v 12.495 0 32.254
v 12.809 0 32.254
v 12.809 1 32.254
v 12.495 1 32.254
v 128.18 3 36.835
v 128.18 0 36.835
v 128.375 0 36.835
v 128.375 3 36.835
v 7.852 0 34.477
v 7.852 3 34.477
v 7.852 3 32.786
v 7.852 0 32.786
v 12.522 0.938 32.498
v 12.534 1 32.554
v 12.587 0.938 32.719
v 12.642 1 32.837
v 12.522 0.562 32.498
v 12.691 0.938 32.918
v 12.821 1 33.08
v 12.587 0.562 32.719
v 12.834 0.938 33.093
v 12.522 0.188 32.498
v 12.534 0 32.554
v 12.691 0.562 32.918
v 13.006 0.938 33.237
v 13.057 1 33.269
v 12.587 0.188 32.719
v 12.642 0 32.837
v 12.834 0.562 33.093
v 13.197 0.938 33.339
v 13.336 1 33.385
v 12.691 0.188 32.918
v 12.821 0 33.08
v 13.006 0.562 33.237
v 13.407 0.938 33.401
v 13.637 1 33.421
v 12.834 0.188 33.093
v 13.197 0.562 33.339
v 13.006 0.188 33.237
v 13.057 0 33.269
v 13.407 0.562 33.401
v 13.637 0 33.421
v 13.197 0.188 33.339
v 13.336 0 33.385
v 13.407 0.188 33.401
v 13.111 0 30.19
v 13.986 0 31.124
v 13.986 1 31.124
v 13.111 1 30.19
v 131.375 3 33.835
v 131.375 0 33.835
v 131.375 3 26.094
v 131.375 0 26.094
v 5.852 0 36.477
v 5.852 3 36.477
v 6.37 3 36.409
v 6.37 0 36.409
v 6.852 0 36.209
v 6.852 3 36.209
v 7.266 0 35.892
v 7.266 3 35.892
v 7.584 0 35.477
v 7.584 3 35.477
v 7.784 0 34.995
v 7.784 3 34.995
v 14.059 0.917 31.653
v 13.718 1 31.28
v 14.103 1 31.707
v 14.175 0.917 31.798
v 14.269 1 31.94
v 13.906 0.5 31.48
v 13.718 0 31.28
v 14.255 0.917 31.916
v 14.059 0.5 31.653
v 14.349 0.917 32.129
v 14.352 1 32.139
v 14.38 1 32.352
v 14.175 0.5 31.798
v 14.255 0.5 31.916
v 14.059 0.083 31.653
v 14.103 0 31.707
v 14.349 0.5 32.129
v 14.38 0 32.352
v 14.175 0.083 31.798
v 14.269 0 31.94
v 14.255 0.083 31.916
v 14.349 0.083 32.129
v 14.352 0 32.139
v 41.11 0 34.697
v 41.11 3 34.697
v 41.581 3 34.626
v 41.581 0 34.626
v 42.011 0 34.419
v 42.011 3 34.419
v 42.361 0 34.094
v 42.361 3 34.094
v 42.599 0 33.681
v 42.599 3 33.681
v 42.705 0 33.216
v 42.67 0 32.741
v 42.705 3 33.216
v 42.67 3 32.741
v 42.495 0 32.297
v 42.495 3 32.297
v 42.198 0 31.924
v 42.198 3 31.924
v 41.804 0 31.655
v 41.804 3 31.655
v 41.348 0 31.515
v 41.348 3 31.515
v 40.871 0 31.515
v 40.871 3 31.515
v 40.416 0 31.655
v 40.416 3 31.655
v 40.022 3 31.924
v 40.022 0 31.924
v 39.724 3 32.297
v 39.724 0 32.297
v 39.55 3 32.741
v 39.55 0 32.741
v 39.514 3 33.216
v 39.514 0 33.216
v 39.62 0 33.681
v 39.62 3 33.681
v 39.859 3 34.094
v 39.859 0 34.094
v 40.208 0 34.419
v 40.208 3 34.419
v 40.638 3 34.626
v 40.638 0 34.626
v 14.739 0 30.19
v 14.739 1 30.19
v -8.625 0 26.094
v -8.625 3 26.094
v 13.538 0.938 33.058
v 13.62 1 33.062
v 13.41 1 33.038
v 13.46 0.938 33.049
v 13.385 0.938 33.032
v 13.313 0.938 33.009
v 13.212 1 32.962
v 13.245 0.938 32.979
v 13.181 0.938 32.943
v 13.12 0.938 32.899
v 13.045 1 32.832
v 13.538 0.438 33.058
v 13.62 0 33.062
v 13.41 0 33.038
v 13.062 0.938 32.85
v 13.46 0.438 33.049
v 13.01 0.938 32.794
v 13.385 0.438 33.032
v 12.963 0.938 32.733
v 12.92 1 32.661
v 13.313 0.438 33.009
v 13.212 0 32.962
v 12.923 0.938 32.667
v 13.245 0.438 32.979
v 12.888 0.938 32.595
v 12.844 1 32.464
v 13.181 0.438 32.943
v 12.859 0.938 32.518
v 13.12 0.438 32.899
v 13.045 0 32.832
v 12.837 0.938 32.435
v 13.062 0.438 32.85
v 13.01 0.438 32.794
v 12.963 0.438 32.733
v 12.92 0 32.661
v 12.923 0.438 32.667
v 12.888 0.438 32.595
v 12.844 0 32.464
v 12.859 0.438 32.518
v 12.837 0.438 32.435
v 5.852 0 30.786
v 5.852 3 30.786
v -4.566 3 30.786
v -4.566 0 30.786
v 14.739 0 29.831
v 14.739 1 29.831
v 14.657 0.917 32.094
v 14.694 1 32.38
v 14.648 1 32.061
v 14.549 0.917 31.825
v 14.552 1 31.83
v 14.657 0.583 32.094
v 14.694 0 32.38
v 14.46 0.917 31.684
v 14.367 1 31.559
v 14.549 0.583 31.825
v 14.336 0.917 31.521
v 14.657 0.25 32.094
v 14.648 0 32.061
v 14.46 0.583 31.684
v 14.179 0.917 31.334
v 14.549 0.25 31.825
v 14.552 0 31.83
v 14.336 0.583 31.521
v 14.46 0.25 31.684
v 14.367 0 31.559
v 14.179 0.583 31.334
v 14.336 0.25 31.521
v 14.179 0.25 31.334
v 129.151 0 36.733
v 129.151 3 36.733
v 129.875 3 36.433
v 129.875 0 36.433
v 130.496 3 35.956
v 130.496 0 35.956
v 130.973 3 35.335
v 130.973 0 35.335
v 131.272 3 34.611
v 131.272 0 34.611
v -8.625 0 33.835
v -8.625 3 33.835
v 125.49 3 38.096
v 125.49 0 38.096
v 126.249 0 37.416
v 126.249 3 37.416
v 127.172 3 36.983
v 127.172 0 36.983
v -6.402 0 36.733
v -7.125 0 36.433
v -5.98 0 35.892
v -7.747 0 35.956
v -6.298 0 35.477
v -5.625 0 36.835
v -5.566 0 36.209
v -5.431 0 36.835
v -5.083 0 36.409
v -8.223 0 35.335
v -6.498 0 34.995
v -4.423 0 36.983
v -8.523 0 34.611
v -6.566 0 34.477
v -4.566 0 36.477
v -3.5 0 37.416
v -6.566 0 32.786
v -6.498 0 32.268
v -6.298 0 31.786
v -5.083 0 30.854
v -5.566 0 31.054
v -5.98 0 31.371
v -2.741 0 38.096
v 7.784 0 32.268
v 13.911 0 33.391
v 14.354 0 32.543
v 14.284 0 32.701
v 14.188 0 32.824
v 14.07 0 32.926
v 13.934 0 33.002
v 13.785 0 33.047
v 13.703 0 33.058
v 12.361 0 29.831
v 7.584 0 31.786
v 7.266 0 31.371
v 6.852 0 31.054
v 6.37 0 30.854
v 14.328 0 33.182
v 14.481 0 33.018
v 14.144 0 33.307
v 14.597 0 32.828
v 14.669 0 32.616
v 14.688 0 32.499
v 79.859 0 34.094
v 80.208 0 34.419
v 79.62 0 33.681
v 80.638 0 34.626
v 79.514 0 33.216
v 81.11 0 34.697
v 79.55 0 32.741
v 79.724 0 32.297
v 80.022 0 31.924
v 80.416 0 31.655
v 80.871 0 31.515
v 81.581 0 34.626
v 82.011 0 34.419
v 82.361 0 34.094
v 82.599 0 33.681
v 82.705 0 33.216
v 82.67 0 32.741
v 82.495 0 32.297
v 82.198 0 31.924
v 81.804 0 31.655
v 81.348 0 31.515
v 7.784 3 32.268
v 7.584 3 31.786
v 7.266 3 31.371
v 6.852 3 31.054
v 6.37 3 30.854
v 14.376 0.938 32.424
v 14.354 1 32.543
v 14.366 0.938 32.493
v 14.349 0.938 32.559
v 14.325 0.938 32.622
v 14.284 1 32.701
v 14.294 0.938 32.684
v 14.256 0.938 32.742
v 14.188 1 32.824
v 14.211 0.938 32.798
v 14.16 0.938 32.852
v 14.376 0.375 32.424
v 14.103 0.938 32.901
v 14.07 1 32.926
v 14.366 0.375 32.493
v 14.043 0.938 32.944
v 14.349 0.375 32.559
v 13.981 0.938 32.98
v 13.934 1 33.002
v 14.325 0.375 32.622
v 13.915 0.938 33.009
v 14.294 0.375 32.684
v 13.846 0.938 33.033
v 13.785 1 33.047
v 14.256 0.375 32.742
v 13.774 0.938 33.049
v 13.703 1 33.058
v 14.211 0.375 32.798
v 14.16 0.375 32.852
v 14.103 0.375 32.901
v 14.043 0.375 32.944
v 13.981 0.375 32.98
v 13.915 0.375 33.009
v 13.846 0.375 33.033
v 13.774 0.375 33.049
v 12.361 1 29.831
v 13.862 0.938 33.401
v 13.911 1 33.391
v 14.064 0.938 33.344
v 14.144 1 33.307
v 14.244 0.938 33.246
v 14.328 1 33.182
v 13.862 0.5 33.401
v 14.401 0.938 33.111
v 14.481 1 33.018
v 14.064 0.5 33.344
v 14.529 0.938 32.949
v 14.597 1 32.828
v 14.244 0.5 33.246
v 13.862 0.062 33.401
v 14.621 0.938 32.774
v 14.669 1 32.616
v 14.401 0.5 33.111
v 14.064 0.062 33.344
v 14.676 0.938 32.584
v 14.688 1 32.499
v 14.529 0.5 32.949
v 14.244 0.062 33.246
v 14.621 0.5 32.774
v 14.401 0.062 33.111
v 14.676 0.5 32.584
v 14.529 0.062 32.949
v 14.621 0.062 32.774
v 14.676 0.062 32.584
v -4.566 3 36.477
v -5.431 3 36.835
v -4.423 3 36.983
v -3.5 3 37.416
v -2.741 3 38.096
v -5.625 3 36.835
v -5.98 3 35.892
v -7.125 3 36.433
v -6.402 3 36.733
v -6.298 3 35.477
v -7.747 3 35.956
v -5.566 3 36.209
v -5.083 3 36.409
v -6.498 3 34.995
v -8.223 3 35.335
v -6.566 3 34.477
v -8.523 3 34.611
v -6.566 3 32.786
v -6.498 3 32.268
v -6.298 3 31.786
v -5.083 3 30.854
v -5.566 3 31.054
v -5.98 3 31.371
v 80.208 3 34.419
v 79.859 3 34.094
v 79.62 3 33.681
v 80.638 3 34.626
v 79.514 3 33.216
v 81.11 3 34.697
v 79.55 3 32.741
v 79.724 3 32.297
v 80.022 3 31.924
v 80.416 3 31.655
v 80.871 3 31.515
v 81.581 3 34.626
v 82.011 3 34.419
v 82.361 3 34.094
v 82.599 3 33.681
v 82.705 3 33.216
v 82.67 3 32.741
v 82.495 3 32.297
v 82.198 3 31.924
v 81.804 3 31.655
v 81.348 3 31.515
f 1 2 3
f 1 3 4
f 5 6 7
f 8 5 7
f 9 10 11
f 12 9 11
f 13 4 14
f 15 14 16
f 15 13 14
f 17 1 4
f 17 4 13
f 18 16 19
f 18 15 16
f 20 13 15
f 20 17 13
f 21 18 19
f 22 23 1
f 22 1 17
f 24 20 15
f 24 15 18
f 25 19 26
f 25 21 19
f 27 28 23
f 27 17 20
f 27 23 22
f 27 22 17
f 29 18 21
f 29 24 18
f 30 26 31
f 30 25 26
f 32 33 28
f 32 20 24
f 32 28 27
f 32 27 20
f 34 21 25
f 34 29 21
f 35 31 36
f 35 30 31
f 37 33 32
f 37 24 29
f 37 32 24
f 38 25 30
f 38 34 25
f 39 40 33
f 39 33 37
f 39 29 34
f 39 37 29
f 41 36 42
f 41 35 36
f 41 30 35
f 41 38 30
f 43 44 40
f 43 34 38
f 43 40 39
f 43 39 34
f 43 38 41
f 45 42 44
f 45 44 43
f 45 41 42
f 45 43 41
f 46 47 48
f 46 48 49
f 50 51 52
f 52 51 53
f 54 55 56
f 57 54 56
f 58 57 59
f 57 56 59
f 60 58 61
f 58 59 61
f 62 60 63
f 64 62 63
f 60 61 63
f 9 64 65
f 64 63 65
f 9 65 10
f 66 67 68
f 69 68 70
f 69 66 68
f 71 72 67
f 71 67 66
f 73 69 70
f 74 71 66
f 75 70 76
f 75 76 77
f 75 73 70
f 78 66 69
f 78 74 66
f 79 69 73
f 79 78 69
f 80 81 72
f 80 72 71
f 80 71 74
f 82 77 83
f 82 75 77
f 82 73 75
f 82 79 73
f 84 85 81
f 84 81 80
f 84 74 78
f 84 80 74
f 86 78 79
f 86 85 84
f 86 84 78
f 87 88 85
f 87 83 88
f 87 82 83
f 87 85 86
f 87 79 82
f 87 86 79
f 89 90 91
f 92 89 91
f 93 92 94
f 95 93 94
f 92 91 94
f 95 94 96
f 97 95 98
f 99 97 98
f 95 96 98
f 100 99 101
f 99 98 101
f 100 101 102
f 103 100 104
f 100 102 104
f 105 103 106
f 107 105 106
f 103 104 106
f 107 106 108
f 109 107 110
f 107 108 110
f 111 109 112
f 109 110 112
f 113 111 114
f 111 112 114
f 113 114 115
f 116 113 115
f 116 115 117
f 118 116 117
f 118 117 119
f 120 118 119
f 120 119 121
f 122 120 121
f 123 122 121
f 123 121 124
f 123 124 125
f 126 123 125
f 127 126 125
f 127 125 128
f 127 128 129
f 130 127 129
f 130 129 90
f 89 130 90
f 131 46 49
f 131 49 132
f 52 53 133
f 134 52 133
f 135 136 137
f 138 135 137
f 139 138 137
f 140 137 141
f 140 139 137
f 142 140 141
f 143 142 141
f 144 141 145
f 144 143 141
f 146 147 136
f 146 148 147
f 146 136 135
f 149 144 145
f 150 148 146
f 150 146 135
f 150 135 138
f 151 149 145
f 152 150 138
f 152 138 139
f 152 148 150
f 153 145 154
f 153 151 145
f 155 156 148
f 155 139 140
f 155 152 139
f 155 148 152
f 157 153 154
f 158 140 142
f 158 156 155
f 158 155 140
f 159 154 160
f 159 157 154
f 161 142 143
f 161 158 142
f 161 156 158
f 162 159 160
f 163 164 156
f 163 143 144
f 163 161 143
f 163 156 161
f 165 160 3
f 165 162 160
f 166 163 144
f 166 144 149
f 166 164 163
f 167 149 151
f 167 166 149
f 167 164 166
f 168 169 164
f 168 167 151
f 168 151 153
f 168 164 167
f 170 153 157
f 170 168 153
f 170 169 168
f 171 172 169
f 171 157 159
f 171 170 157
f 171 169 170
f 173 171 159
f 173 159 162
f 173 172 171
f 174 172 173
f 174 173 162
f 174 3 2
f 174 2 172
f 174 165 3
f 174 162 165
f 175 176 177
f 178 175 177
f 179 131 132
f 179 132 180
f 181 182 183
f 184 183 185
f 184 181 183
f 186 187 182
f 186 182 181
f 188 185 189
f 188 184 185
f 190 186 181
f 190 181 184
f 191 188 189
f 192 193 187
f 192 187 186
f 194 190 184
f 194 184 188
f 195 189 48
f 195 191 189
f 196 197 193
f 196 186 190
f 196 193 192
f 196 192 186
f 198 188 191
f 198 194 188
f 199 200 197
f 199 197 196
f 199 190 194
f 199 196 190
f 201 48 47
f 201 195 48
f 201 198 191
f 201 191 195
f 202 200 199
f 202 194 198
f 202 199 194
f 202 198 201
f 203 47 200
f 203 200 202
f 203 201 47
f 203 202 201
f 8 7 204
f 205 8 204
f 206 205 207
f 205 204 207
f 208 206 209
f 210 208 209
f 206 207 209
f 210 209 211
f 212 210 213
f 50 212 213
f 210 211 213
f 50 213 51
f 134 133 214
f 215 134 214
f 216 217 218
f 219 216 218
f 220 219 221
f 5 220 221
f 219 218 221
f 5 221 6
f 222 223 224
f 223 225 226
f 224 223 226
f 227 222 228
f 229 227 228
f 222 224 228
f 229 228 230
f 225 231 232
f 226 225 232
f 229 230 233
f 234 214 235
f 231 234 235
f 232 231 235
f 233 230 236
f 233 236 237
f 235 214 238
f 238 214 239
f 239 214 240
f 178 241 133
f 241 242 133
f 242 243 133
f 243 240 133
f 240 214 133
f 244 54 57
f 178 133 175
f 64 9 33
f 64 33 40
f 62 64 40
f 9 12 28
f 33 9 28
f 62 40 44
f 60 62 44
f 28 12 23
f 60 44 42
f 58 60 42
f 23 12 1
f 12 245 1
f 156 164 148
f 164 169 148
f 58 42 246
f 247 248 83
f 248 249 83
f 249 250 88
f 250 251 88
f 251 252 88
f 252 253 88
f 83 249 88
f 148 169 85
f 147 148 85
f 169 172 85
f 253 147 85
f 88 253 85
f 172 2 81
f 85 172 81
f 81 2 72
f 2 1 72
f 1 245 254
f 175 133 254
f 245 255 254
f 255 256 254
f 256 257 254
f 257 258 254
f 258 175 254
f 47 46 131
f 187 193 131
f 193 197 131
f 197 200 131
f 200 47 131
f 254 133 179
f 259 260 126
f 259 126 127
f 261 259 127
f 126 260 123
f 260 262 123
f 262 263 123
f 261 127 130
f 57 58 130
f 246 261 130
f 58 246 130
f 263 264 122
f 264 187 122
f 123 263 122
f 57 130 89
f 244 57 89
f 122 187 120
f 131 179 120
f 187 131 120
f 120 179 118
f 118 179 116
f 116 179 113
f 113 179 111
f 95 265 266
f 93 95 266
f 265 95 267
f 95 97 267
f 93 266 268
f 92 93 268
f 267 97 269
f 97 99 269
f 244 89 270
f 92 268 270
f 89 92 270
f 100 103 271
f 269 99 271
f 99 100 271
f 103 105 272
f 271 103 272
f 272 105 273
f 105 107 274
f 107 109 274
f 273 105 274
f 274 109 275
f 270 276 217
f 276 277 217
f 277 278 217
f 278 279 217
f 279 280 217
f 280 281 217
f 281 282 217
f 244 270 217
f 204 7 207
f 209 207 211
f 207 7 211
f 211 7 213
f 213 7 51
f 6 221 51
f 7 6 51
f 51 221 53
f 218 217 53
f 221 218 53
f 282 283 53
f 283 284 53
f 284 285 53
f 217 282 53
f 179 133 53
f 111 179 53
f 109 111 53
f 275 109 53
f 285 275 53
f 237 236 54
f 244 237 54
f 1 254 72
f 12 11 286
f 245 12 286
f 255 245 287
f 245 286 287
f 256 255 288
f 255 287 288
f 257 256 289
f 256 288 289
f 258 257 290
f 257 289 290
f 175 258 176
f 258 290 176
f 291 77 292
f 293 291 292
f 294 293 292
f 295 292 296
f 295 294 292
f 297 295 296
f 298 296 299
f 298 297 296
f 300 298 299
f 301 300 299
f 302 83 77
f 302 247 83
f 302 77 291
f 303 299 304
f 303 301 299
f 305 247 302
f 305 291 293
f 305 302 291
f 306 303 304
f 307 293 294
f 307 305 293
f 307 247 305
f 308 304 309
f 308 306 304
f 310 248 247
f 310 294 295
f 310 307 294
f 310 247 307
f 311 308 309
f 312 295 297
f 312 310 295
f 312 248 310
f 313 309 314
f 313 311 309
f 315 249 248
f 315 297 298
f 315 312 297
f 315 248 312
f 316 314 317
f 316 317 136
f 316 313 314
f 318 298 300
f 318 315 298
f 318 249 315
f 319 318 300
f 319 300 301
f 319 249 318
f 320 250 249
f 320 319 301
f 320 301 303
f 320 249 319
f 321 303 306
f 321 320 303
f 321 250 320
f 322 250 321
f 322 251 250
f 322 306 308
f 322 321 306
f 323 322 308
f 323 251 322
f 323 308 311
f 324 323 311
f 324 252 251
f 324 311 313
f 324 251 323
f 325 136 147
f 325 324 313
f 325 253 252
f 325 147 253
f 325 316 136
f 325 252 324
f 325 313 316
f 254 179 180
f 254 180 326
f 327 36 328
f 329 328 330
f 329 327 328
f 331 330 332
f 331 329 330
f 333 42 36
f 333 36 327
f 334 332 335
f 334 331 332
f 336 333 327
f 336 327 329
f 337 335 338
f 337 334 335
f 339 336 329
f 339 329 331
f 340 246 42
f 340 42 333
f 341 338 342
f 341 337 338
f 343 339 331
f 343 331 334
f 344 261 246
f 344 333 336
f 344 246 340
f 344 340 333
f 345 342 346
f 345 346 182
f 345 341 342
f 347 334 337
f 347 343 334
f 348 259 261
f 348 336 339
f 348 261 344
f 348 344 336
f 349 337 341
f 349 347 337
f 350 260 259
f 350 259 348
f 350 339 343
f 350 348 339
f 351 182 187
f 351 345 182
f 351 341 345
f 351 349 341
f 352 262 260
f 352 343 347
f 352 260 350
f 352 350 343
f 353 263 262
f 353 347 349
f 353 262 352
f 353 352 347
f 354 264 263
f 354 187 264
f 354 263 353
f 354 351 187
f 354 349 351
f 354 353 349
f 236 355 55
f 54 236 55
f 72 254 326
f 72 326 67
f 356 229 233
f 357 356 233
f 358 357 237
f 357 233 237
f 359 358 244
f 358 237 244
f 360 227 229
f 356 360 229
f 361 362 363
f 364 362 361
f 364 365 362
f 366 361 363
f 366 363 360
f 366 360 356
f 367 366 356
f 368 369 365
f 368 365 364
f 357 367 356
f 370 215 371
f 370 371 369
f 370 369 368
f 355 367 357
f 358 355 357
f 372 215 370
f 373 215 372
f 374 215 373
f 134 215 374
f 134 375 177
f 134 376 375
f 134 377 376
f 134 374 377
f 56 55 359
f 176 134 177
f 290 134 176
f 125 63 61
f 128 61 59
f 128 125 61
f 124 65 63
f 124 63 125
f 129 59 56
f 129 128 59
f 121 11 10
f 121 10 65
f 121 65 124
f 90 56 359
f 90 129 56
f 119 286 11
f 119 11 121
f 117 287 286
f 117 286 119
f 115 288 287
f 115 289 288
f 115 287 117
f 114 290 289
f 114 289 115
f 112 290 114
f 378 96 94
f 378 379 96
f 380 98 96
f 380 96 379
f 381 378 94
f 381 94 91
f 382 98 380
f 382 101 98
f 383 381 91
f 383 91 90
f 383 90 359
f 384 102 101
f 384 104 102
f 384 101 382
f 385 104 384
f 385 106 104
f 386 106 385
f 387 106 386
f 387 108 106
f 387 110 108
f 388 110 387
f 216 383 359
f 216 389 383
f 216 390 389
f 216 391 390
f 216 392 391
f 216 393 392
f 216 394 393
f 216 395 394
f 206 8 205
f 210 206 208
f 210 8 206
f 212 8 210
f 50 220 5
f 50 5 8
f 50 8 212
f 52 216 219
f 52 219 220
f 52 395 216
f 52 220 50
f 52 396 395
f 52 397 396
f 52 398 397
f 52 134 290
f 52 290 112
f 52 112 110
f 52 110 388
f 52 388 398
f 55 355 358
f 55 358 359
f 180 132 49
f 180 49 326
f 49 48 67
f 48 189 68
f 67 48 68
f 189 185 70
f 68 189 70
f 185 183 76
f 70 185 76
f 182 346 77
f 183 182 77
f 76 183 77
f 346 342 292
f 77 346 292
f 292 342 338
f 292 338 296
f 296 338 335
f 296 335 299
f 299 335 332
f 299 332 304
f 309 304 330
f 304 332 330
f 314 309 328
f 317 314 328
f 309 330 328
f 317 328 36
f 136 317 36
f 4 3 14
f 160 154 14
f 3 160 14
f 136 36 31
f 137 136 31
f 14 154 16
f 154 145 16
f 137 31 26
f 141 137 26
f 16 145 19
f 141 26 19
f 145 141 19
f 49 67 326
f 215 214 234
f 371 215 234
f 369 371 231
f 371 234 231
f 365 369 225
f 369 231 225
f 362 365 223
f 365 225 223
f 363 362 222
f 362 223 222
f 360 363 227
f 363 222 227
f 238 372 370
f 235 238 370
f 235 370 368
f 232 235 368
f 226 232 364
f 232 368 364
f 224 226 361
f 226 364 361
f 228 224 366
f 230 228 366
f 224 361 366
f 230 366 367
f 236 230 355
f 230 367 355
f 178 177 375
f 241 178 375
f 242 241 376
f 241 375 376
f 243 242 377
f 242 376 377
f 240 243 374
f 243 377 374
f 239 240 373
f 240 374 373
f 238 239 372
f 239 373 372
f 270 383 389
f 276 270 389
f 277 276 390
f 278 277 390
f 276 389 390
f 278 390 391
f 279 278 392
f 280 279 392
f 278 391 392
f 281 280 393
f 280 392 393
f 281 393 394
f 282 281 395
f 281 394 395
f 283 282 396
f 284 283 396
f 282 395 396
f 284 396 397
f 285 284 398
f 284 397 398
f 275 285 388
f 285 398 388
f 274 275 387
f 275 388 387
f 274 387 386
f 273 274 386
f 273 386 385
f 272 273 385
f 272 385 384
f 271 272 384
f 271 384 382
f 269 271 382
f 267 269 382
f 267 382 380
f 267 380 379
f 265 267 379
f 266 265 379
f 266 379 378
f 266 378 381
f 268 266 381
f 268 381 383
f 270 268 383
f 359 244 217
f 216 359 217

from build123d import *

# Parameters (mm, degrees)
BOSS_EXTRUDE1_DEPTH = 3
CUT_EXTRUDE1_REACH  = 138.82
CUT_EXTRUDE2_DEPTH  = 1
CUT_EXTRUDE3_DEPTH  = 3


with BuildPart() as part:
    # Sketch3 → Boss-Extrude1 (new body)
    with BuildSketch(Plane(origin=(0, 0, 0), x_dir=(1, 0, 0), z_dir=(0, 1, 0))):
        with BuildLine():
            Line((131.37466785, -33.834747513), (131.37466785, -26.093767651))
            Line((131.37466785, -26.093767651), (-8.62533215, -26.093767651))
            Line((-8.62533215, -26.093767651), (-8.62533215, -33.834747513))
            ThreePointArc((-8.62533215, -33.834747513), (-7.746652493, -35.956067857), (-5.62533215, -36.834747513))
            Line((-5.62533215, -36.834747513), (-5.431022837, -36.834747513))
            ThreePointArc((-5.431022837, -36.834747513), (-3.945556452, -37.165616778), (-2.74094445, -38.095667731))
            Line((-2.74094445, -38.095667731), (125.49028015, -38.095667731))
            ThreePointArc((125.49028015, -38.095667731), (126.694892152, -37.165616778), (128.180358538, -36.834747513))
            Line((128.180358538, -36.834747513), (128.37466785, -36.834747513))
            ThreePointArc((128.37466785, -36.834747513), (130.495988194, -35.956067857), (131.37466785, -33.834747513))
        make_face()
    extrude(amount=BOSS_EXTRUDE1_DEPTH)

    # Sketch4 → Cut-Extrude1 (cut, up to next)
    with BuildSketch(Plane(origin=(0, 3, 0), x_dir=(1, 0, 0), z_dir=(0, 1, 0)), mode=Mode.PRIVATE) as cut_extrude1_sk1:
        with BuildLine():
            ThreePointArc((81.109797099, -31.496885933), (79.509797099, -33.096885933), (81.109797099, -34.696885933))
            ThreePointArc((81.109797099, -34.696885933), (82.709797099, -33.096885933), (81.109797099, -31.496885933))
        make_face()
    cut_extrude1_tool1 = extrude(cut_extrude1_sk1.sketch, amount=-CUT_EXTRUDE1_REACH, mode=Mode.PRIVATE) & part.part
    # Sketch4 → Cut-Extrude1 (cut, up to next)
    with BuildSketch(Plane(origin=(0, 3, 0), x_dir=(1, 0, 0), z_dir=(0, 1, 0)), mode=Mode.PRIVATE) as cut_extrude1_sk2:
        with BuildLine():
            ThreePointArc((41.109797099, -31.496885933), (39.509797099, -33.096885933), (41.109797099, -34.696885933))
            ThreePointArc((41.109797099, -34.696885933), (42.709797099, -33.096885933), (41.109797099, -31.496885933))
        make_face()
    cut_extrude1_tool2 = extrude(cut_extrude1_sk2.sketch, amount=-CUT_EXTRUDE1_REACH, mode=Mode.PRIVATE) & part.part
    add(cut_extrude1_tool1.solids().sort_by_distance((81.109797, 3, 33.096886))[0], mode=Mode.SUBTRACT)
    add(cut_extrude1_tool2.solids().sort_by_distance((41.109797, 3, 33.096886))[0], mode=Mode.SUBTRACT)

    # Sketch5 → Cut-Extrude2 (cut)
    with BuildSketch(Plane.XZ):
        with BuildLine():
            Line((12.809243061, 32.25429666), (12.495140497, 32.25429666))
            add(Edge.make_bspline(
                [(12.495140497, 32.25429666), (12.49718765, 32.295967547), (12.501208204, 32.377808062), (12.520036494, 32.497131968), (12.546977371, 32.611186767), (12.585068825, 32.719056681), (12.632375103, 32.821695488), (12.68910513, 32.918695504), (12.75629898, 33.009686693), (12.832505715, 33.093825536), (12.915274354, 33.171013107), (13.004580293, 33.23766835), (13.09842532, 33.293986021), (13.196524719, 33.341067263), (13.299985283, 33.376407109), (13.407868141, 33.402628748), (13.520647277, 33.418405094), (13.597487299, 33.42010088), (13.636566779, 33.420963326)],
                knots=[0, 0, 0, 0, 1.10065271, 2.161652631, 3.183658789, 4.190468796, 5.17591951, 6.163126047, 7.15150782, 8.156236427, 9.156009102, 10.134482811, 11.092018607, 12.041330605, 13.001268258, 13.972401359, 14.968799086, 16, 16, 16, 16], degree=3))
            add(Edge.make_bspline(
                [(13.636566779, 33.420963326), (13.674944853, 33.42006487), (13.750356398, 33.418299435), (13.860418413, 33.403138406), (13.965195707, 33.379392814), (14.064483474, 33.346077398), (14.157489538, 33.30129297), (14.244912583, 33.247495432), (14.327793393, 33.1852756), (14.402400177, 33.112021787), (14.470908256, 33.033819402), (14.530010511, 32.950331499), (14.580623675, 32.864102213), (14.622811355, 32.774474012), (14.653867494, 32.680602983), (14.677445702, 32.58385578), (14.690773115, 32.483230969), (14.692818539, 32.415124414), (14.693858446, 32.380498583)],
                knots=[0, 0, 0, 0, 1.111607364, 2.184268762, 3.212621178, 4.221274766, 5.211760367, 6.196651075, 7.1921475, 8.207485113, 9.220403448, 10.201281604, 11.166441695, 12.114753415, 13.065576456, 14.026450734, 14.996634279, 16, 16, 16, 16], degree=3))
            add(Edge.make_bspline(
                [(14.693858446, 32.380498583), (14.692171801, 32.331748773), (14.688828109, 32.235104645), (14.659972407, 32.092900288), (14.61539031, 31.954995228), (14.561317281, 31.844016176), (14.506696713, 31.755039283), (14.458516917, 31.681123642), (14.400864565, 31.602297225), (14.334267151, 31.517766116), (14.259729345, 31.427271746), (14.176714677, 31.33077698), (14.084588987, 31.229306675), (14.019930805, 31.160000862), (13.986426555, 31.124088326)],
                knots=[0, 0, 0, 0, 1.184203166, 2.347625244, 3.513805382, 4.700623107, 5.337941753, 6.051866363, 6.845199593, 7.711357327, 8.668078039, 9.695487809, 10.805859518, 12, 12, 12, 12], degree=3))
            Line((13.986426555, 31.124088326), (13.110725433, 30.190194095))
            Line((13.110725433, 30.190194095), (14.738730241, 30.190194095))
            Line((14.738730241, 30.190194095), (14.738730241, 29.831219737))
            Line((14.738730241, 29.831219737), (12.360525113, 29.831219737))
            Line((12.360525113, 29.831219737), (13.717896908, 31.279737365))
            add(Edge.make_bspline(
                [(13.717896908, 31.279737365), (13.750944794, 31.314235671), (13.814423021, 31.380499858), (13.904205598, 31.477242818), (13.984844587, 31.566992359), (14.056861979, 31.649578907), (14.118695485, 31.726210475), (14.173567717, 31.794405179), (14.217533308, 31.857159629), (14.265248703, 31.929900243), (14.311462685, 32.01871256), (14.351175041, 32.127246249), (14.375389889, 32.238973502), (14.378294725, 32.314475539), (14.379755882, 32.352453711)],
                knots=[0, 0, 0, 0, 1.329631726, 2.553950428, 3.673215718, 4.687767853, 5.603093632, 6.413772471, 7.123043292, 7.734684054, 8.834405432, 9.900288307, 10.943827018, 12, 12, 12, 12], degree=3))
            add(Edge.make_bspline(
                [(14.379755882, 32.352453711), (14.37912014, 32.376335109), (14.377867214, 32.42340076), (14.366809516, 32.492406519), (14.35009901, 32.558971332), (14.326153752, 32.623299952), (14.294547012, 32.684745604), (14.256073632, 32.743383084), (14.211683569, 32.800072049), (14.160332299, 32.853225347), (14.103920779, 32.901906553), (14.04432653, 32.945030638), (13.981276426, 32.981069749), (13.915036303, 33.010613246), (13.845790834, 33.033788627), (13.773406089, 33.049847207), (13.698082073, 33.059929691), (13.646648577, 33.061293862), (13.620440978, 33.061988967)],
                knots=[0, 0, 0, 0, 0.991446411, 1.95395049, 2.89581595, 3.838931463, 4.798493298, 5.75982156, 6.748411868, 7.785213223, 8.824556874, 9.840280684, 10.836137867, 11.835679398, 12.848801643, 13.863922112, 14.911575587, 16, 16, 16, 16], degree=3))
            add(Edge.make_bspline(
                [(13.620440978, 33.061988967), (13.593070145, 33.061273935), (13.539318349, 33.05986973), (13.460399316, 33.050047066), (13.385113539, 33.033101225), (13.313271636, 33.009924551), (13.24475205, 32.980466002), (13.179888006, 32.943774257), (13.118825117, 32.899990764), (13.061448593, 32.850350208), (13.008584614, 32.795082607), (12.962137738, 32.733472644), (12.921553724, 32.666645228), (12.886144491, 32.594780678), (12.857388801, 32.517226898), (12.83541565, 32.434259193), (12.818028803, 32.346237811), (12.812220283, 32.285452727), (12.809243061, 32.25429666)],
                knots=[0, 0, 0, 0, 1.031018746, 2.02475058, 2.990194455, 3.934040569, 4.864654155, 5.795059489, 6.735614925, 7.690564532, 8.649604399, 9.611025574, 10.590972636, 11.591080095, 12.624614302, 13.701020113, 14.821632451, 16, 16, 16, 16], degree=3))
        make_face()
    extrude(amount=-CUT_EXTRUDE2_DEPTH, mode=Mode.SUBTRACT)

    # Sketch6 → Cut-Extrude3 (cut)
    with BuildSketch(Plane(origin=(0, 3, 0), x_dir=(1, 0, 0), z_dir=(0, 1, 0))):
        with BuildLine():
            Line((5.852113338, -30.785571201), (-4.565790678, -30.785571201))
            ThreePointArc((-4.565790678, -30.785571201), (-5.98000424, -31.371357639), (-6.565790678, -32.785571201))
            Line((-6.565790678, -32.785571201), (-6.565790678, -34.477380503))
            ThreePointArc((-6.565790678, -34.477380503), (-5.98000424, -35.891594066), (-4.565790678, -36.477380503))
            Line((-4.565790678, -36.477380503), (5.852113338, -36.477380503))
            ThreePointArc((5.852113338, -36.477380503), (7.266326901, -35.891594066), (7.852113338, -34.477380503))
            Line((7.852113338, -34.477380503), (7.852113338, -32.785571201))
            ThreePointArc((7.852113338, -32.785571201), (7.266326901, -31.371357639), (5.852113338, -30.785571201))
        make_face()
    extrude(amount=-CUT_EXTRUDE3_DEPTH, mode=Mode.SUBTRACT)


solid = part.part
